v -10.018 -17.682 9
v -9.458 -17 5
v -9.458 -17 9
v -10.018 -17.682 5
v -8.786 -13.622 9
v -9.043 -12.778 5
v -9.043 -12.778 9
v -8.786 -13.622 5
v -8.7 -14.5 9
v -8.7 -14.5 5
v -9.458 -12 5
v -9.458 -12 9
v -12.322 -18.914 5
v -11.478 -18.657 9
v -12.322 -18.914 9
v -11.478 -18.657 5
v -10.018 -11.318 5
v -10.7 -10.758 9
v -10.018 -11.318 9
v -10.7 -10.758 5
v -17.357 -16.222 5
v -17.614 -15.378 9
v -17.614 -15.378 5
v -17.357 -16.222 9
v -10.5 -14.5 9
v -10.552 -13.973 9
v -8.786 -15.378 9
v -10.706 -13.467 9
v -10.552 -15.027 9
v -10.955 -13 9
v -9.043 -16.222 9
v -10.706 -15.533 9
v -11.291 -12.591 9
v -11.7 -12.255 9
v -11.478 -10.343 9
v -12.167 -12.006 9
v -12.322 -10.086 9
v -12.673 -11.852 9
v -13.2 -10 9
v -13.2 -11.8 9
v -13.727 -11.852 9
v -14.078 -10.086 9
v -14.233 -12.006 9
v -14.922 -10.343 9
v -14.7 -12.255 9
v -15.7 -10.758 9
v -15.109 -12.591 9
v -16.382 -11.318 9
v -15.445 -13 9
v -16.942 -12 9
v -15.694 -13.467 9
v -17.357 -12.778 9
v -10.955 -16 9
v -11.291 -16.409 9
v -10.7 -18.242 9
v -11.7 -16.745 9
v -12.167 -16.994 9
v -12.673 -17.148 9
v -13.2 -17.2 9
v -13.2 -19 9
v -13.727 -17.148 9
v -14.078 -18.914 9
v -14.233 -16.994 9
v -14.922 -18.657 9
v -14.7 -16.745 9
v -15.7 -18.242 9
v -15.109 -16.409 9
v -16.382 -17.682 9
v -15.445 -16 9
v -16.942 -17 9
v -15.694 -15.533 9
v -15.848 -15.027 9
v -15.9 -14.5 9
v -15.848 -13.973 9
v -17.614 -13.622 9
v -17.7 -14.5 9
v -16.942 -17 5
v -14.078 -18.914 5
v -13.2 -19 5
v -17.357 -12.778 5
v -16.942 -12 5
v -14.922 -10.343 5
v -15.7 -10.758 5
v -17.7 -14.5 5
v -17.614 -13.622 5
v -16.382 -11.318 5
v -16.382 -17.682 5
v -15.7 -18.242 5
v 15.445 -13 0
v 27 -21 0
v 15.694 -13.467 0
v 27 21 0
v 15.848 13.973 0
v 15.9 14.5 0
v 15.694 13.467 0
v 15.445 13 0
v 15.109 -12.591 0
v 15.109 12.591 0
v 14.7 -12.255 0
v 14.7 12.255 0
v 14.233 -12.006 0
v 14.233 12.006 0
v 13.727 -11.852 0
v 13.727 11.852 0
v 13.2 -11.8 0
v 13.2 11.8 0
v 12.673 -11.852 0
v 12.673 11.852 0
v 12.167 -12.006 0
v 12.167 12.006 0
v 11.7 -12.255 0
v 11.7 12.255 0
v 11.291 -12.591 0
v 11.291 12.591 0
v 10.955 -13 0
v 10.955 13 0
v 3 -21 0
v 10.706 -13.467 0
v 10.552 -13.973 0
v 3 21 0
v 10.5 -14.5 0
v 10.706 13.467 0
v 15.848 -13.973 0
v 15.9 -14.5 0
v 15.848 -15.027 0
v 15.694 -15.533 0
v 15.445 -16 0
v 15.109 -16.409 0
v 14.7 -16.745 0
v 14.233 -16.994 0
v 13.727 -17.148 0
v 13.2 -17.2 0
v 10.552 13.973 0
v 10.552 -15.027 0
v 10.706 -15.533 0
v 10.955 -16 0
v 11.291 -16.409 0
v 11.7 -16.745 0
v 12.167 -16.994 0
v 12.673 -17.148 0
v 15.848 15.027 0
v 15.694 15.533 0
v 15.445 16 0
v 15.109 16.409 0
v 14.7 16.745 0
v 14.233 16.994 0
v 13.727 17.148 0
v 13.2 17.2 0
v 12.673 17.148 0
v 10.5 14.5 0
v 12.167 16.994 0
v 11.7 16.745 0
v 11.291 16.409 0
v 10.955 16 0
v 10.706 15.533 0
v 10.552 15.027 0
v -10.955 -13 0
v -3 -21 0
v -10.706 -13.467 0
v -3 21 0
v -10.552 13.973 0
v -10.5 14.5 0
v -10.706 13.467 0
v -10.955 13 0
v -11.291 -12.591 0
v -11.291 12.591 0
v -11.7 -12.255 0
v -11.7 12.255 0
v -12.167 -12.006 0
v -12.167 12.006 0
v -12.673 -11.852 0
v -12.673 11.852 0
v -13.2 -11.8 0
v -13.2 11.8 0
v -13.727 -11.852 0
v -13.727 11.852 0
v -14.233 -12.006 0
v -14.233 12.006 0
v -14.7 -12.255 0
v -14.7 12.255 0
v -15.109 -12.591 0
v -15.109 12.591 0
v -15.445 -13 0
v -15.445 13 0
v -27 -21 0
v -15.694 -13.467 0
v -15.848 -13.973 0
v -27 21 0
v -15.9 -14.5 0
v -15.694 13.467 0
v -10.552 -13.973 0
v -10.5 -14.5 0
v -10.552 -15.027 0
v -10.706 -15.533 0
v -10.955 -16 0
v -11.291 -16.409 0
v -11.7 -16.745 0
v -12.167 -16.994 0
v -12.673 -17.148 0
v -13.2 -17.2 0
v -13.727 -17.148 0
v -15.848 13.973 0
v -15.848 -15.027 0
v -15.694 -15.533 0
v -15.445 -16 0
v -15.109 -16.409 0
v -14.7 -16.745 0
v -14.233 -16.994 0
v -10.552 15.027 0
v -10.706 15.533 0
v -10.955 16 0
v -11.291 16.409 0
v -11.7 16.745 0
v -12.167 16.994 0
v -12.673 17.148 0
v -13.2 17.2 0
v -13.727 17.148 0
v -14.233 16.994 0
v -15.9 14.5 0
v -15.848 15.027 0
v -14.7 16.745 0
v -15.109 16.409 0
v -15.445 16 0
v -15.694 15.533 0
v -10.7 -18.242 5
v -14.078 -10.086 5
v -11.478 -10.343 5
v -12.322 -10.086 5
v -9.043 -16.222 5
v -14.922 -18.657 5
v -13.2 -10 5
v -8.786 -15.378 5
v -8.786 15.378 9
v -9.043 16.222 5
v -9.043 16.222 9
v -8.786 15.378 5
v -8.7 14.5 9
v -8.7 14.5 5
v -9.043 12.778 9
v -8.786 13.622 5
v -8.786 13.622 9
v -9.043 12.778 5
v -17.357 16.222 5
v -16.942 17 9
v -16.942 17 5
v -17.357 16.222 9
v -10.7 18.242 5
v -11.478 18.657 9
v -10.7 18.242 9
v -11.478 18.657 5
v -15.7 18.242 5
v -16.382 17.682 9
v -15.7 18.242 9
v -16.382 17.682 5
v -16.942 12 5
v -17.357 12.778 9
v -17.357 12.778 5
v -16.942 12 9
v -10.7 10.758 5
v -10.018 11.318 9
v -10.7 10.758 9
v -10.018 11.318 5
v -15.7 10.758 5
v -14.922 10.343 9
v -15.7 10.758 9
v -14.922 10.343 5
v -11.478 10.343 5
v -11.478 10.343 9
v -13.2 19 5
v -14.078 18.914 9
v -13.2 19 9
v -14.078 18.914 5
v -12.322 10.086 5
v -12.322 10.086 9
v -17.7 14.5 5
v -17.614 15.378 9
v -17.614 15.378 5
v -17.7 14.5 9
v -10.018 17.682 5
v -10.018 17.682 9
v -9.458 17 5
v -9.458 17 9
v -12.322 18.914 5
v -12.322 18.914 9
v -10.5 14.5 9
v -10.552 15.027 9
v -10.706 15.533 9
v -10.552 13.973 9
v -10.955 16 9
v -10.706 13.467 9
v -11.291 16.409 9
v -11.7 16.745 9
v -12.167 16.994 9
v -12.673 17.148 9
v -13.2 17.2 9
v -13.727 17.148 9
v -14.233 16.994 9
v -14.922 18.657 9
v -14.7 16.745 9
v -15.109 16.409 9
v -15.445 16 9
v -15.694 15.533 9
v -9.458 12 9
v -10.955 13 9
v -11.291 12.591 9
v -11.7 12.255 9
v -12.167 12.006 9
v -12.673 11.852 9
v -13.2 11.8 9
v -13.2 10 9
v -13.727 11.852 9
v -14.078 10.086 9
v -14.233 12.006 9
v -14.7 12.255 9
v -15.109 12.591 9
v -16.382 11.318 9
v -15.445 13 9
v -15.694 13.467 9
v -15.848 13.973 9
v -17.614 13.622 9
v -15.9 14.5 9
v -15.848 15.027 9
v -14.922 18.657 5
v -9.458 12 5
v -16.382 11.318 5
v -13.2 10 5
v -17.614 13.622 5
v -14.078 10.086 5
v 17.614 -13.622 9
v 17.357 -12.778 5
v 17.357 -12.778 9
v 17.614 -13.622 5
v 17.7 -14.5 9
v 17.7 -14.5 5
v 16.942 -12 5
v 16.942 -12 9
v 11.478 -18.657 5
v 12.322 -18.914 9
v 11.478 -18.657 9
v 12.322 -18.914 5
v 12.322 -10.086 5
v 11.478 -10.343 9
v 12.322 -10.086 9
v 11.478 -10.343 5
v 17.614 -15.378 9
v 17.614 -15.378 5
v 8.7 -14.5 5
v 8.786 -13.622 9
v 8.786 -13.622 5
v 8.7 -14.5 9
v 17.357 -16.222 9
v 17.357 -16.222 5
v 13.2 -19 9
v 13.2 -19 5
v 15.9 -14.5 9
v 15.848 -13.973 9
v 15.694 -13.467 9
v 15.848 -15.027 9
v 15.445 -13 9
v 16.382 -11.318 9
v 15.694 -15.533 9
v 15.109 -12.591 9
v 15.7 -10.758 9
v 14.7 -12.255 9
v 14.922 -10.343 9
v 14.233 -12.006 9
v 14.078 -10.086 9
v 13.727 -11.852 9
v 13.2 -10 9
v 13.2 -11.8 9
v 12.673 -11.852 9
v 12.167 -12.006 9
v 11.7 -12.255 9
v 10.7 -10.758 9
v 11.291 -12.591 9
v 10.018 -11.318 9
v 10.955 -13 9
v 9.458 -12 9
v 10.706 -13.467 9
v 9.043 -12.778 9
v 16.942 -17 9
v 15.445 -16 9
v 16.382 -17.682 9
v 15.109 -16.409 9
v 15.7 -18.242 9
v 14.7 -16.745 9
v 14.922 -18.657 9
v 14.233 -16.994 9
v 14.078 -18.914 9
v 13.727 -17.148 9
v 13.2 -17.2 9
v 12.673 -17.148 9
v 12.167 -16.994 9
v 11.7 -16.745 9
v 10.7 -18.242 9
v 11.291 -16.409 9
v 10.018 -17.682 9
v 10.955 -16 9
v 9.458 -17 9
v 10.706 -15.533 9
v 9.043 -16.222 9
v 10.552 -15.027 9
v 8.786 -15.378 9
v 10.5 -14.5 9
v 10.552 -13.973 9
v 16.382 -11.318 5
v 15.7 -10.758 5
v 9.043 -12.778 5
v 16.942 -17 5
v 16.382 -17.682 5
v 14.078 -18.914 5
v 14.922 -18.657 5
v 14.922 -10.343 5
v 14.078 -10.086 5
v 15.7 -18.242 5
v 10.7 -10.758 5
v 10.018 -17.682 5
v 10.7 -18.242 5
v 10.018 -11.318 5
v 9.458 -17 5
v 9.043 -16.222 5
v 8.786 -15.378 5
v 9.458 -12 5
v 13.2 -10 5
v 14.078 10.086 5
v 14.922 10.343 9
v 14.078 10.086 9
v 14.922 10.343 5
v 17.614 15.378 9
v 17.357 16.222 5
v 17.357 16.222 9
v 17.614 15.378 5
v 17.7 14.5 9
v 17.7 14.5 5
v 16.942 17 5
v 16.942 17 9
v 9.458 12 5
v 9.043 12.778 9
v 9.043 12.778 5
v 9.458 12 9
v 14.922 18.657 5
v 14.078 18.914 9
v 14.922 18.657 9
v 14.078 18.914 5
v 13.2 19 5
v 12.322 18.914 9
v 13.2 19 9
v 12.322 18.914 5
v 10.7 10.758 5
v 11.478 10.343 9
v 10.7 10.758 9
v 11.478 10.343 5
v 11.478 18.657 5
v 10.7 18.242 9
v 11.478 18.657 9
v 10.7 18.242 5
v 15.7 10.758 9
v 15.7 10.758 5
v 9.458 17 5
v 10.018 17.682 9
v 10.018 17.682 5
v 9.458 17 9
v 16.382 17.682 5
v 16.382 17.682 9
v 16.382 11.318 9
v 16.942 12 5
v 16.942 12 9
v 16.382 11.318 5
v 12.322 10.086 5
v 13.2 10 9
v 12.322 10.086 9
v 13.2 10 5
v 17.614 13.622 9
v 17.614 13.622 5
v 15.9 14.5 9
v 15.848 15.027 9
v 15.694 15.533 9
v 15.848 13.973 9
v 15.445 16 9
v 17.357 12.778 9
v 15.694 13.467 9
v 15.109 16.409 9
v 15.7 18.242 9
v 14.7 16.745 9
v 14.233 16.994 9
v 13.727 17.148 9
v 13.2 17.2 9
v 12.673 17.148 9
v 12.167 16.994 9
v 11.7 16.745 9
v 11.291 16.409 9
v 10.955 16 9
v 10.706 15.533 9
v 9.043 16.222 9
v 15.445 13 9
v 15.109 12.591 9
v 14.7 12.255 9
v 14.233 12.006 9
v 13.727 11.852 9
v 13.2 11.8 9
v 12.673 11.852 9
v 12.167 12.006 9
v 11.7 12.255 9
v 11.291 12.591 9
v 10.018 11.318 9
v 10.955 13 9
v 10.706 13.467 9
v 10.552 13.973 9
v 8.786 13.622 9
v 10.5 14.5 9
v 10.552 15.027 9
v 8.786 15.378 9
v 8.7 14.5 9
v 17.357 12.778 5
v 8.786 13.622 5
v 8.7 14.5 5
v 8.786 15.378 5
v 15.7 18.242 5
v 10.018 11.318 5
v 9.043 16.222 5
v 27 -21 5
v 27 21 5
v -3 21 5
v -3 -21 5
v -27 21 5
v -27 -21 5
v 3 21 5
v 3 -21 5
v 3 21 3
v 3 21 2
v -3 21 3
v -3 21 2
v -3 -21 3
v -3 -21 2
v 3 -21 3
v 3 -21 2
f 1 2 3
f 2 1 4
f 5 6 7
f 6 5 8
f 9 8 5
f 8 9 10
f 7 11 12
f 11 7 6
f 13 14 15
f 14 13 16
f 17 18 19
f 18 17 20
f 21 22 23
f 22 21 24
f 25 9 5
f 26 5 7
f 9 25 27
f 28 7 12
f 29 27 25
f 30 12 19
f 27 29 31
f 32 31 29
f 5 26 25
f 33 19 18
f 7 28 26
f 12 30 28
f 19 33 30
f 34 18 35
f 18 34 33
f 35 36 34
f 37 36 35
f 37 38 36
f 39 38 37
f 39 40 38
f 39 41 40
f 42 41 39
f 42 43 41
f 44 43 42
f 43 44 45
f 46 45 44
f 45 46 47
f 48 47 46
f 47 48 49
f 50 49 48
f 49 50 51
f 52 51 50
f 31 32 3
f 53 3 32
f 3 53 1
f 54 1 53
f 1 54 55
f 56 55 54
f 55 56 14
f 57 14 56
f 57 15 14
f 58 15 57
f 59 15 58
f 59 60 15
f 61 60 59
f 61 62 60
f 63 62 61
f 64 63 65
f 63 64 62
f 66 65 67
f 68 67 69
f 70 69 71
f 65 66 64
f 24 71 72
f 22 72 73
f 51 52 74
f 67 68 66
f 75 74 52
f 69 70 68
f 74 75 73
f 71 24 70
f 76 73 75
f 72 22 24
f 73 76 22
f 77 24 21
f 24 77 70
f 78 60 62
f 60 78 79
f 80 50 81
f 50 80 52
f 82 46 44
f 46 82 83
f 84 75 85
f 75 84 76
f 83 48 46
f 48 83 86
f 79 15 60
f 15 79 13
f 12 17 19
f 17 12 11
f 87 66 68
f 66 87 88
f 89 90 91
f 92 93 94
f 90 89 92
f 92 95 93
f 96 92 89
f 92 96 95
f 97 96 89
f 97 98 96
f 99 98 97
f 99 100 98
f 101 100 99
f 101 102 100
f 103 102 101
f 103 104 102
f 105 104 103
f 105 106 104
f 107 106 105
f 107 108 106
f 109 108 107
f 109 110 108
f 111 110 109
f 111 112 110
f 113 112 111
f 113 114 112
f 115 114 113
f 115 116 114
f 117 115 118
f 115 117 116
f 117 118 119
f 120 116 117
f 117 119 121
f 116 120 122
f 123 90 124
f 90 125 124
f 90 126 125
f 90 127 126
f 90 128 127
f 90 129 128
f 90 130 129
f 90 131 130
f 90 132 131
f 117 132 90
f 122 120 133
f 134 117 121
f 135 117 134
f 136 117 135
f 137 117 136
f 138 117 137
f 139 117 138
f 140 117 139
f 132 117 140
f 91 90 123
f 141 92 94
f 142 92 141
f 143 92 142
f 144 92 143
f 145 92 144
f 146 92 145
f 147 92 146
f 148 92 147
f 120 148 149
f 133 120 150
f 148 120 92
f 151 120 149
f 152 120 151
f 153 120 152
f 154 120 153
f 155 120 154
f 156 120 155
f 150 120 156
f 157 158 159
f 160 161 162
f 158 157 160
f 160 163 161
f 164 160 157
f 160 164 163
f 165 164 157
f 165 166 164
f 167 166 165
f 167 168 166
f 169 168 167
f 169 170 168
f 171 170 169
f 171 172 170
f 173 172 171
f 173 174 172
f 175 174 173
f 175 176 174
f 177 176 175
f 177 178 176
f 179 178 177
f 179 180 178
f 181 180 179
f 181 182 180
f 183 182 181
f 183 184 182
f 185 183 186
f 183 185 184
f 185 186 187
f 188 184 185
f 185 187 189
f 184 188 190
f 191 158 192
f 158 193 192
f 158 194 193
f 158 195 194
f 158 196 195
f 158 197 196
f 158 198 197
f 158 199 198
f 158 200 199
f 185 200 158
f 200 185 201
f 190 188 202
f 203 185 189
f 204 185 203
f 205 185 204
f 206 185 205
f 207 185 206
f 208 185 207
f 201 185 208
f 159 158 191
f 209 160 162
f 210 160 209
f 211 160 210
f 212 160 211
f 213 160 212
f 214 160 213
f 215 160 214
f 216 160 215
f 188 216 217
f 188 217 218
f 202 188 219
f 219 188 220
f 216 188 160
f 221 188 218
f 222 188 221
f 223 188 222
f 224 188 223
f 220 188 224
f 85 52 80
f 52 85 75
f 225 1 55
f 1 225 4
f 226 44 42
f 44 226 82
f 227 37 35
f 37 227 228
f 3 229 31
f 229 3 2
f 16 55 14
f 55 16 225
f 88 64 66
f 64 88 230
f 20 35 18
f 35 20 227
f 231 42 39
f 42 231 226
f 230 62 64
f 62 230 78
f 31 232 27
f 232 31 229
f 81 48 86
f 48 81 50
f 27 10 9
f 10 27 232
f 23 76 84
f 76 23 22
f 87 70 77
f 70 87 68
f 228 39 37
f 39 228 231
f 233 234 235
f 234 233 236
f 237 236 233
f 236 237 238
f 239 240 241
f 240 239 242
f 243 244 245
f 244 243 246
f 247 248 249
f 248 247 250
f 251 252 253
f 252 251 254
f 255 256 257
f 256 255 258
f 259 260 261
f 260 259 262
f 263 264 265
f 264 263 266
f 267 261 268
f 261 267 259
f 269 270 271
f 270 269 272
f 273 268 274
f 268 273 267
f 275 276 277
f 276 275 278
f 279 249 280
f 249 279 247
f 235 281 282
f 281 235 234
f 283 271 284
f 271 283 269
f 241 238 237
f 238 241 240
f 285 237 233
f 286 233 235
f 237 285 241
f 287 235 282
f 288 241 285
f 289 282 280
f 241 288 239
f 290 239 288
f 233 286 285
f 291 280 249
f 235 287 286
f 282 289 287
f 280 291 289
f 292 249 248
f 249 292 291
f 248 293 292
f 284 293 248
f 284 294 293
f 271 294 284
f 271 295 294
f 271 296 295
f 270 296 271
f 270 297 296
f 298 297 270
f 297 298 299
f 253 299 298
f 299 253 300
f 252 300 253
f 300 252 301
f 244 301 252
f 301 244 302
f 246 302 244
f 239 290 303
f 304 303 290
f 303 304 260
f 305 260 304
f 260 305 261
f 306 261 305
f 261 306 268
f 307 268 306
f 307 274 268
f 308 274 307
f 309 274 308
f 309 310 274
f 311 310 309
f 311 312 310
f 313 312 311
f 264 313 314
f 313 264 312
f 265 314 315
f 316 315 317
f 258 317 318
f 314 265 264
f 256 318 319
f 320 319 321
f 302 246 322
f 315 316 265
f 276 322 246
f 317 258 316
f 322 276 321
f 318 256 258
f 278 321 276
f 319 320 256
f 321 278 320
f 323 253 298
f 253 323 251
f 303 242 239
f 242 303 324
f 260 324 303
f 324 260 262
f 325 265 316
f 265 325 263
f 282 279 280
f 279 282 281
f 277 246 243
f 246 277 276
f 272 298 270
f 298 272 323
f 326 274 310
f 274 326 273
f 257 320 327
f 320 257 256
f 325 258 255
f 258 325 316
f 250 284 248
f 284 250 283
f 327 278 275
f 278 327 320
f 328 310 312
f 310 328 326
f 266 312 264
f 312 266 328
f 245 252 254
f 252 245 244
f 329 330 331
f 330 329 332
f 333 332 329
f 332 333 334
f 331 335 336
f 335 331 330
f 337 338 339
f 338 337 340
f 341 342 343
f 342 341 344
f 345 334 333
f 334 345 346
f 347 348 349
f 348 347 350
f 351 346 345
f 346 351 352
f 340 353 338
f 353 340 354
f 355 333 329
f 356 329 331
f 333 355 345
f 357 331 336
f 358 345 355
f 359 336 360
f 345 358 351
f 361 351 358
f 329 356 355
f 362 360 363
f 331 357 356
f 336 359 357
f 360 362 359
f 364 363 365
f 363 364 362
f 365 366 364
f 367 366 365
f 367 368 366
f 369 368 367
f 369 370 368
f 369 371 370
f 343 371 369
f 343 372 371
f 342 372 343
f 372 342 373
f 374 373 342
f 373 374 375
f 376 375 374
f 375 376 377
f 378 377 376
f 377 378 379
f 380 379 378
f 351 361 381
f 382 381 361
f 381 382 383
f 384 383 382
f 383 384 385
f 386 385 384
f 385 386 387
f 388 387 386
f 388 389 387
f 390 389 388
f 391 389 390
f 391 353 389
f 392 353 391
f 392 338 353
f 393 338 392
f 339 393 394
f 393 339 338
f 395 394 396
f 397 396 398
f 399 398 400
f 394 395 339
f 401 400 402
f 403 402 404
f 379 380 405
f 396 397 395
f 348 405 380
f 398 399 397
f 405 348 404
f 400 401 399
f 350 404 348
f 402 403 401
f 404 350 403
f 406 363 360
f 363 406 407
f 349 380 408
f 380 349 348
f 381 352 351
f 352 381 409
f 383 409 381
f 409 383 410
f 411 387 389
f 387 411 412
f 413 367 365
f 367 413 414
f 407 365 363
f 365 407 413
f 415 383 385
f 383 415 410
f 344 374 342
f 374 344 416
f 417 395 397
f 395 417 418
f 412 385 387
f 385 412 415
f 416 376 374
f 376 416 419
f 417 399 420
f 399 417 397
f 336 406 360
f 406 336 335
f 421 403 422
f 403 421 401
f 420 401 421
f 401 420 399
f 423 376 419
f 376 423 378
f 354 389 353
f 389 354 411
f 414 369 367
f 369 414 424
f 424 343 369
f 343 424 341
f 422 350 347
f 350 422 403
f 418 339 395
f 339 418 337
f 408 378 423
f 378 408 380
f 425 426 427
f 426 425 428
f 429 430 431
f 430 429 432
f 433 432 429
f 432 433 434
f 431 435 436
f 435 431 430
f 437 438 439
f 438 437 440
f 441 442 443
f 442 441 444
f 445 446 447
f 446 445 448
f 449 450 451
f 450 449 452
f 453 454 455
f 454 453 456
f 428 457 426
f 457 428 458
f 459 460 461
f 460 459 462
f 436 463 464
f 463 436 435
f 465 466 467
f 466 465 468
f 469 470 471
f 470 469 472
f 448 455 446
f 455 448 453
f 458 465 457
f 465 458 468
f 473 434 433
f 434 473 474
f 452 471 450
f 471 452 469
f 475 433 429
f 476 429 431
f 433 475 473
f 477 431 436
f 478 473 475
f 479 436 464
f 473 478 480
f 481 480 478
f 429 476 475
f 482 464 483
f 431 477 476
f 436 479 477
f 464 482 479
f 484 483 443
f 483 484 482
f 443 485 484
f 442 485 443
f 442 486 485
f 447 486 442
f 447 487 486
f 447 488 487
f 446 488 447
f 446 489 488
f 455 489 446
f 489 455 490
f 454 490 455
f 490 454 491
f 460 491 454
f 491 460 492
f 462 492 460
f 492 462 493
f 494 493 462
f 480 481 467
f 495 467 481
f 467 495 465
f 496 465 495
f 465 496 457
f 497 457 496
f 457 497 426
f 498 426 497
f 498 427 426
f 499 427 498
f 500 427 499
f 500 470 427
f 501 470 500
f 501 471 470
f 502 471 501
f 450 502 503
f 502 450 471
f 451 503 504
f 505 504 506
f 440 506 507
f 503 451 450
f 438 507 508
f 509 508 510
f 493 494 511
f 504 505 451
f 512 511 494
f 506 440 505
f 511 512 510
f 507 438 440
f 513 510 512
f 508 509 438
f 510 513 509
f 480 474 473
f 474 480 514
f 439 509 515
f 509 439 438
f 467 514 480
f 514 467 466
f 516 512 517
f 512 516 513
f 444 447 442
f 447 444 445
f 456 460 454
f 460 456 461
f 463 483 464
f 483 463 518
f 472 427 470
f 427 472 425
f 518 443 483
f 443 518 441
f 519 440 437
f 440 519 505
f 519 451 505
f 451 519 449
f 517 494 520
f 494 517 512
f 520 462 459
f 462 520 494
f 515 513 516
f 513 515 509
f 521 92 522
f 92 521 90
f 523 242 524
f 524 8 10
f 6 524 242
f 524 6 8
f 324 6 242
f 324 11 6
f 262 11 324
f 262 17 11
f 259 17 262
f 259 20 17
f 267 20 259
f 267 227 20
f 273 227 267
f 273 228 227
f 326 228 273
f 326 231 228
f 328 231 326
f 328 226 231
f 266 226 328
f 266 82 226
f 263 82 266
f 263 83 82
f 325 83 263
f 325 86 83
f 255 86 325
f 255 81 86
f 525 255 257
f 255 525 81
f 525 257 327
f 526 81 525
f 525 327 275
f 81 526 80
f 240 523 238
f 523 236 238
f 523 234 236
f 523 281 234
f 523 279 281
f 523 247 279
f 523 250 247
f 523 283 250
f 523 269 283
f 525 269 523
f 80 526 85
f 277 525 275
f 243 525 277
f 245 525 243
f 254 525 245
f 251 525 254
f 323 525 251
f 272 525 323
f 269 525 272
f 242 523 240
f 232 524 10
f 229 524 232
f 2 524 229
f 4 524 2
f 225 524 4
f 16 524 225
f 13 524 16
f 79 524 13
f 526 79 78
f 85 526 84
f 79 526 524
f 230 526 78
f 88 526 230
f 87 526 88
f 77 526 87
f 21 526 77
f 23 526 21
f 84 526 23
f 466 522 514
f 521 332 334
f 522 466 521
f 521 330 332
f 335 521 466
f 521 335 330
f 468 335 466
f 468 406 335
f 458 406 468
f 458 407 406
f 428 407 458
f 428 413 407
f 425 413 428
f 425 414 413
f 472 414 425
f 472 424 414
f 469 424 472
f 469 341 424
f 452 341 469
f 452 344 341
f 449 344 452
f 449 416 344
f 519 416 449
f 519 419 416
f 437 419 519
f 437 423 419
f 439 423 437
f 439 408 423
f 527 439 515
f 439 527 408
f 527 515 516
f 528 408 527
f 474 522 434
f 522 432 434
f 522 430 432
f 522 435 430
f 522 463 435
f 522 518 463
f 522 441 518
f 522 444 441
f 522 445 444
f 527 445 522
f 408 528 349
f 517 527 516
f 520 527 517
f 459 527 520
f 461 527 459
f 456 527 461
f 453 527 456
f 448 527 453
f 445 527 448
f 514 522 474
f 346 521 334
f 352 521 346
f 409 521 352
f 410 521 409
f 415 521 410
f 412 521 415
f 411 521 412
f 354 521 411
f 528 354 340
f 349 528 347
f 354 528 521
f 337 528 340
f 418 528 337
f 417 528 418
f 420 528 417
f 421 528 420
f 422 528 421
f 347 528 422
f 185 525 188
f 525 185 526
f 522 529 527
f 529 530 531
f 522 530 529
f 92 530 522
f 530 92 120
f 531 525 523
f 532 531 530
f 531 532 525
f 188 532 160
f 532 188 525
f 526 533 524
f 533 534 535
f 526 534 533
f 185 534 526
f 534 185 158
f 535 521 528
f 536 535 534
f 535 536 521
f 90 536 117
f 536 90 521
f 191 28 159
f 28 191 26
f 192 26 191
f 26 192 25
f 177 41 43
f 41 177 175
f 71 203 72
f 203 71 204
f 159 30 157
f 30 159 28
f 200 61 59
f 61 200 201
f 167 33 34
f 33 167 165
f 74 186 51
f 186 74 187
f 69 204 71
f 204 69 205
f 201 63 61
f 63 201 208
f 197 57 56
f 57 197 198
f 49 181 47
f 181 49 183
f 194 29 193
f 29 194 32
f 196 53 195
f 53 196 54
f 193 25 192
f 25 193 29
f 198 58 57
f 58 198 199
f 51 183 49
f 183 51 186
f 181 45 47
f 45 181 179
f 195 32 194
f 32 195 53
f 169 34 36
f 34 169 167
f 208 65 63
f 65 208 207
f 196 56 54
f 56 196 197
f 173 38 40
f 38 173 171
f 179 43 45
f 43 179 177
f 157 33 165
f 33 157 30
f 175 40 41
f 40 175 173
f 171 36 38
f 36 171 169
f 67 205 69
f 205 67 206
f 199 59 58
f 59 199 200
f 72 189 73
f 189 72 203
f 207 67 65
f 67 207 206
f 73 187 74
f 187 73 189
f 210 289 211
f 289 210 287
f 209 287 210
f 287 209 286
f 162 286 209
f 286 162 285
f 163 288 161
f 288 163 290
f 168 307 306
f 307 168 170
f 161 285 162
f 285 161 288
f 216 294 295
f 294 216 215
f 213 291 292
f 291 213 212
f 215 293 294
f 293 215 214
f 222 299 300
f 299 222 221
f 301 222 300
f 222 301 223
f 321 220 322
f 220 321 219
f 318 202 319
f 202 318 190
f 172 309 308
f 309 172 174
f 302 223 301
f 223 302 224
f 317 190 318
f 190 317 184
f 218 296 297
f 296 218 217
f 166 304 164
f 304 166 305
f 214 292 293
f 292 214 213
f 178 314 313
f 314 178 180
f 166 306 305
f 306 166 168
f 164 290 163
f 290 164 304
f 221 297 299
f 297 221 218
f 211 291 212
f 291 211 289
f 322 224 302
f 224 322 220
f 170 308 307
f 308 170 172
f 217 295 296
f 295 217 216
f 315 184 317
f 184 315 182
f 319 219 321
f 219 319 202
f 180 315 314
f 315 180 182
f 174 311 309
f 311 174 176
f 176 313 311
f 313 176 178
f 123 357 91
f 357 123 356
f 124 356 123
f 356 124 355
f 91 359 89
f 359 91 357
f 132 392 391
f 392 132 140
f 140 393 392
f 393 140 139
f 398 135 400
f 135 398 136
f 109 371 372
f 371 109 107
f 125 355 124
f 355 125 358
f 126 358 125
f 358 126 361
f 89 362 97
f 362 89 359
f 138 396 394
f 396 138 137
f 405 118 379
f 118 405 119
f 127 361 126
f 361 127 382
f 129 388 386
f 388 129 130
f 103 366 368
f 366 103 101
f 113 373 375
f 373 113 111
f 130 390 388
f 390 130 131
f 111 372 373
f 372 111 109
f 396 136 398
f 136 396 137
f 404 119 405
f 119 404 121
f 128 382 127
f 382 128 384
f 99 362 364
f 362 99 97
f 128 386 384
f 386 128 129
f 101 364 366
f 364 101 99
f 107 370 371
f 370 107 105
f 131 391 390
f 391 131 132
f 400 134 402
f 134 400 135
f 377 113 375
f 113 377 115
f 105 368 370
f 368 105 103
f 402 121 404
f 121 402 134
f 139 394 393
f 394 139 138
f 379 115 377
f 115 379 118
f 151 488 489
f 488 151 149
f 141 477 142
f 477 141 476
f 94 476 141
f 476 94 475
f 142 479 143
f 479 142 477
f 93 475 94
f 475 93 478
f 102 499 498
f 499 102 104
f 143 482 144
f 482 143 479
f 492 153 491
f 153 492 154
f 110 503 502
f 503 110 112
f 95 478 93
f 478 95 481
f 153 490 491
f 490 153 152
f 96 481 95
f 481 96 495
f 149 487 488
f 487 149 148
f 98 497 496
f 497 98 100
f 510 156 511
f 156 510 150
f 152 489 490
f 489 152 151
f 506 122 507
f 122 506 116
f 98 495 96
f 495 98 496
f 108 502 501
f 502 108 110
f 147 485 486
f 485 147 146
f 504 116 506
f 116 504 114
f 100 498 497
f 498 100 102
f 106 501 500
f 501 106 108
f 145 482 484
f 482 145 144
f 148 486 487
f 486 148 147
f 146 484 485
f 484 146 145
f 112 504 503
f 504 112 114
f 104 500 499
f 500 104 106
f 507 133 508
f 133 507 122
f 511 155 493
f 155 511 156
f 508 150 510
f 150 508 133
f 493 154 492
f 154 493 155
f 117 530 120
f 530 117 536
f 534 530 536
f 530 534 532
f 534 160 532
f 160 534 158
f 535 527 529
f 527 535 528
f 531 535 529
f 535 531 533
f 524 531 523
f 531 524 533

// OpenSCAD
$fn = 32;

// ----------------------------------------------------------------------
// Living hinge: 54 x 42 mm plates, 1 mm flexible web
// ----------------------------------------------------------------------

// --- parameters (mm) ---
plate_len = 24;           // plate length outside the web
plate_w = 42;             // plate width
thick = 5;                // plate thickness
web_half = 3;             // half width of the flex band
web_t = 1;                // flexible web thickness
web_z = 2;                // web position inside the thickness
boss_d = 9;               // screw boss diameter
boss_h = 9;               // screw boss height
boss_x = 13.2;            // screw boss distance from the web
screw_d = 5.4;            // screw hole

difference() {
  union() {
    /* one flat strip, later thinned at the middle */
    translate([-27, -21, 0]) cube([54, 42, 5]);
    /* screw bosses, sunk 0.5 mm into the plates */
    for (sx = [-13.2, 13.2]) {
      for (sy = [-14.5, 14.5]) {
        translate([sx, sy, 0]) cylinder(h = boss_h, d = boss_d);
      }
    }
  }
  /* channel from below: leaves the web on top of it */
  translate([-3, -23.5, -2.5]) cube([6, 47, 4.5]);
  /* channel from above: thins the web down to web_t */
  translate([-3, -23.5, 3]) cube([6, 47, 4.5]);
  /* screw holes through the bosses */
  for (sx = [-13.2, 13.2]) {
    for (sy = [-14.5, 14.5]) {
      translate([sx, sy, -2.5]) cylinder(h = boss_h + 5, d = screw_d);
    }
  }
}
